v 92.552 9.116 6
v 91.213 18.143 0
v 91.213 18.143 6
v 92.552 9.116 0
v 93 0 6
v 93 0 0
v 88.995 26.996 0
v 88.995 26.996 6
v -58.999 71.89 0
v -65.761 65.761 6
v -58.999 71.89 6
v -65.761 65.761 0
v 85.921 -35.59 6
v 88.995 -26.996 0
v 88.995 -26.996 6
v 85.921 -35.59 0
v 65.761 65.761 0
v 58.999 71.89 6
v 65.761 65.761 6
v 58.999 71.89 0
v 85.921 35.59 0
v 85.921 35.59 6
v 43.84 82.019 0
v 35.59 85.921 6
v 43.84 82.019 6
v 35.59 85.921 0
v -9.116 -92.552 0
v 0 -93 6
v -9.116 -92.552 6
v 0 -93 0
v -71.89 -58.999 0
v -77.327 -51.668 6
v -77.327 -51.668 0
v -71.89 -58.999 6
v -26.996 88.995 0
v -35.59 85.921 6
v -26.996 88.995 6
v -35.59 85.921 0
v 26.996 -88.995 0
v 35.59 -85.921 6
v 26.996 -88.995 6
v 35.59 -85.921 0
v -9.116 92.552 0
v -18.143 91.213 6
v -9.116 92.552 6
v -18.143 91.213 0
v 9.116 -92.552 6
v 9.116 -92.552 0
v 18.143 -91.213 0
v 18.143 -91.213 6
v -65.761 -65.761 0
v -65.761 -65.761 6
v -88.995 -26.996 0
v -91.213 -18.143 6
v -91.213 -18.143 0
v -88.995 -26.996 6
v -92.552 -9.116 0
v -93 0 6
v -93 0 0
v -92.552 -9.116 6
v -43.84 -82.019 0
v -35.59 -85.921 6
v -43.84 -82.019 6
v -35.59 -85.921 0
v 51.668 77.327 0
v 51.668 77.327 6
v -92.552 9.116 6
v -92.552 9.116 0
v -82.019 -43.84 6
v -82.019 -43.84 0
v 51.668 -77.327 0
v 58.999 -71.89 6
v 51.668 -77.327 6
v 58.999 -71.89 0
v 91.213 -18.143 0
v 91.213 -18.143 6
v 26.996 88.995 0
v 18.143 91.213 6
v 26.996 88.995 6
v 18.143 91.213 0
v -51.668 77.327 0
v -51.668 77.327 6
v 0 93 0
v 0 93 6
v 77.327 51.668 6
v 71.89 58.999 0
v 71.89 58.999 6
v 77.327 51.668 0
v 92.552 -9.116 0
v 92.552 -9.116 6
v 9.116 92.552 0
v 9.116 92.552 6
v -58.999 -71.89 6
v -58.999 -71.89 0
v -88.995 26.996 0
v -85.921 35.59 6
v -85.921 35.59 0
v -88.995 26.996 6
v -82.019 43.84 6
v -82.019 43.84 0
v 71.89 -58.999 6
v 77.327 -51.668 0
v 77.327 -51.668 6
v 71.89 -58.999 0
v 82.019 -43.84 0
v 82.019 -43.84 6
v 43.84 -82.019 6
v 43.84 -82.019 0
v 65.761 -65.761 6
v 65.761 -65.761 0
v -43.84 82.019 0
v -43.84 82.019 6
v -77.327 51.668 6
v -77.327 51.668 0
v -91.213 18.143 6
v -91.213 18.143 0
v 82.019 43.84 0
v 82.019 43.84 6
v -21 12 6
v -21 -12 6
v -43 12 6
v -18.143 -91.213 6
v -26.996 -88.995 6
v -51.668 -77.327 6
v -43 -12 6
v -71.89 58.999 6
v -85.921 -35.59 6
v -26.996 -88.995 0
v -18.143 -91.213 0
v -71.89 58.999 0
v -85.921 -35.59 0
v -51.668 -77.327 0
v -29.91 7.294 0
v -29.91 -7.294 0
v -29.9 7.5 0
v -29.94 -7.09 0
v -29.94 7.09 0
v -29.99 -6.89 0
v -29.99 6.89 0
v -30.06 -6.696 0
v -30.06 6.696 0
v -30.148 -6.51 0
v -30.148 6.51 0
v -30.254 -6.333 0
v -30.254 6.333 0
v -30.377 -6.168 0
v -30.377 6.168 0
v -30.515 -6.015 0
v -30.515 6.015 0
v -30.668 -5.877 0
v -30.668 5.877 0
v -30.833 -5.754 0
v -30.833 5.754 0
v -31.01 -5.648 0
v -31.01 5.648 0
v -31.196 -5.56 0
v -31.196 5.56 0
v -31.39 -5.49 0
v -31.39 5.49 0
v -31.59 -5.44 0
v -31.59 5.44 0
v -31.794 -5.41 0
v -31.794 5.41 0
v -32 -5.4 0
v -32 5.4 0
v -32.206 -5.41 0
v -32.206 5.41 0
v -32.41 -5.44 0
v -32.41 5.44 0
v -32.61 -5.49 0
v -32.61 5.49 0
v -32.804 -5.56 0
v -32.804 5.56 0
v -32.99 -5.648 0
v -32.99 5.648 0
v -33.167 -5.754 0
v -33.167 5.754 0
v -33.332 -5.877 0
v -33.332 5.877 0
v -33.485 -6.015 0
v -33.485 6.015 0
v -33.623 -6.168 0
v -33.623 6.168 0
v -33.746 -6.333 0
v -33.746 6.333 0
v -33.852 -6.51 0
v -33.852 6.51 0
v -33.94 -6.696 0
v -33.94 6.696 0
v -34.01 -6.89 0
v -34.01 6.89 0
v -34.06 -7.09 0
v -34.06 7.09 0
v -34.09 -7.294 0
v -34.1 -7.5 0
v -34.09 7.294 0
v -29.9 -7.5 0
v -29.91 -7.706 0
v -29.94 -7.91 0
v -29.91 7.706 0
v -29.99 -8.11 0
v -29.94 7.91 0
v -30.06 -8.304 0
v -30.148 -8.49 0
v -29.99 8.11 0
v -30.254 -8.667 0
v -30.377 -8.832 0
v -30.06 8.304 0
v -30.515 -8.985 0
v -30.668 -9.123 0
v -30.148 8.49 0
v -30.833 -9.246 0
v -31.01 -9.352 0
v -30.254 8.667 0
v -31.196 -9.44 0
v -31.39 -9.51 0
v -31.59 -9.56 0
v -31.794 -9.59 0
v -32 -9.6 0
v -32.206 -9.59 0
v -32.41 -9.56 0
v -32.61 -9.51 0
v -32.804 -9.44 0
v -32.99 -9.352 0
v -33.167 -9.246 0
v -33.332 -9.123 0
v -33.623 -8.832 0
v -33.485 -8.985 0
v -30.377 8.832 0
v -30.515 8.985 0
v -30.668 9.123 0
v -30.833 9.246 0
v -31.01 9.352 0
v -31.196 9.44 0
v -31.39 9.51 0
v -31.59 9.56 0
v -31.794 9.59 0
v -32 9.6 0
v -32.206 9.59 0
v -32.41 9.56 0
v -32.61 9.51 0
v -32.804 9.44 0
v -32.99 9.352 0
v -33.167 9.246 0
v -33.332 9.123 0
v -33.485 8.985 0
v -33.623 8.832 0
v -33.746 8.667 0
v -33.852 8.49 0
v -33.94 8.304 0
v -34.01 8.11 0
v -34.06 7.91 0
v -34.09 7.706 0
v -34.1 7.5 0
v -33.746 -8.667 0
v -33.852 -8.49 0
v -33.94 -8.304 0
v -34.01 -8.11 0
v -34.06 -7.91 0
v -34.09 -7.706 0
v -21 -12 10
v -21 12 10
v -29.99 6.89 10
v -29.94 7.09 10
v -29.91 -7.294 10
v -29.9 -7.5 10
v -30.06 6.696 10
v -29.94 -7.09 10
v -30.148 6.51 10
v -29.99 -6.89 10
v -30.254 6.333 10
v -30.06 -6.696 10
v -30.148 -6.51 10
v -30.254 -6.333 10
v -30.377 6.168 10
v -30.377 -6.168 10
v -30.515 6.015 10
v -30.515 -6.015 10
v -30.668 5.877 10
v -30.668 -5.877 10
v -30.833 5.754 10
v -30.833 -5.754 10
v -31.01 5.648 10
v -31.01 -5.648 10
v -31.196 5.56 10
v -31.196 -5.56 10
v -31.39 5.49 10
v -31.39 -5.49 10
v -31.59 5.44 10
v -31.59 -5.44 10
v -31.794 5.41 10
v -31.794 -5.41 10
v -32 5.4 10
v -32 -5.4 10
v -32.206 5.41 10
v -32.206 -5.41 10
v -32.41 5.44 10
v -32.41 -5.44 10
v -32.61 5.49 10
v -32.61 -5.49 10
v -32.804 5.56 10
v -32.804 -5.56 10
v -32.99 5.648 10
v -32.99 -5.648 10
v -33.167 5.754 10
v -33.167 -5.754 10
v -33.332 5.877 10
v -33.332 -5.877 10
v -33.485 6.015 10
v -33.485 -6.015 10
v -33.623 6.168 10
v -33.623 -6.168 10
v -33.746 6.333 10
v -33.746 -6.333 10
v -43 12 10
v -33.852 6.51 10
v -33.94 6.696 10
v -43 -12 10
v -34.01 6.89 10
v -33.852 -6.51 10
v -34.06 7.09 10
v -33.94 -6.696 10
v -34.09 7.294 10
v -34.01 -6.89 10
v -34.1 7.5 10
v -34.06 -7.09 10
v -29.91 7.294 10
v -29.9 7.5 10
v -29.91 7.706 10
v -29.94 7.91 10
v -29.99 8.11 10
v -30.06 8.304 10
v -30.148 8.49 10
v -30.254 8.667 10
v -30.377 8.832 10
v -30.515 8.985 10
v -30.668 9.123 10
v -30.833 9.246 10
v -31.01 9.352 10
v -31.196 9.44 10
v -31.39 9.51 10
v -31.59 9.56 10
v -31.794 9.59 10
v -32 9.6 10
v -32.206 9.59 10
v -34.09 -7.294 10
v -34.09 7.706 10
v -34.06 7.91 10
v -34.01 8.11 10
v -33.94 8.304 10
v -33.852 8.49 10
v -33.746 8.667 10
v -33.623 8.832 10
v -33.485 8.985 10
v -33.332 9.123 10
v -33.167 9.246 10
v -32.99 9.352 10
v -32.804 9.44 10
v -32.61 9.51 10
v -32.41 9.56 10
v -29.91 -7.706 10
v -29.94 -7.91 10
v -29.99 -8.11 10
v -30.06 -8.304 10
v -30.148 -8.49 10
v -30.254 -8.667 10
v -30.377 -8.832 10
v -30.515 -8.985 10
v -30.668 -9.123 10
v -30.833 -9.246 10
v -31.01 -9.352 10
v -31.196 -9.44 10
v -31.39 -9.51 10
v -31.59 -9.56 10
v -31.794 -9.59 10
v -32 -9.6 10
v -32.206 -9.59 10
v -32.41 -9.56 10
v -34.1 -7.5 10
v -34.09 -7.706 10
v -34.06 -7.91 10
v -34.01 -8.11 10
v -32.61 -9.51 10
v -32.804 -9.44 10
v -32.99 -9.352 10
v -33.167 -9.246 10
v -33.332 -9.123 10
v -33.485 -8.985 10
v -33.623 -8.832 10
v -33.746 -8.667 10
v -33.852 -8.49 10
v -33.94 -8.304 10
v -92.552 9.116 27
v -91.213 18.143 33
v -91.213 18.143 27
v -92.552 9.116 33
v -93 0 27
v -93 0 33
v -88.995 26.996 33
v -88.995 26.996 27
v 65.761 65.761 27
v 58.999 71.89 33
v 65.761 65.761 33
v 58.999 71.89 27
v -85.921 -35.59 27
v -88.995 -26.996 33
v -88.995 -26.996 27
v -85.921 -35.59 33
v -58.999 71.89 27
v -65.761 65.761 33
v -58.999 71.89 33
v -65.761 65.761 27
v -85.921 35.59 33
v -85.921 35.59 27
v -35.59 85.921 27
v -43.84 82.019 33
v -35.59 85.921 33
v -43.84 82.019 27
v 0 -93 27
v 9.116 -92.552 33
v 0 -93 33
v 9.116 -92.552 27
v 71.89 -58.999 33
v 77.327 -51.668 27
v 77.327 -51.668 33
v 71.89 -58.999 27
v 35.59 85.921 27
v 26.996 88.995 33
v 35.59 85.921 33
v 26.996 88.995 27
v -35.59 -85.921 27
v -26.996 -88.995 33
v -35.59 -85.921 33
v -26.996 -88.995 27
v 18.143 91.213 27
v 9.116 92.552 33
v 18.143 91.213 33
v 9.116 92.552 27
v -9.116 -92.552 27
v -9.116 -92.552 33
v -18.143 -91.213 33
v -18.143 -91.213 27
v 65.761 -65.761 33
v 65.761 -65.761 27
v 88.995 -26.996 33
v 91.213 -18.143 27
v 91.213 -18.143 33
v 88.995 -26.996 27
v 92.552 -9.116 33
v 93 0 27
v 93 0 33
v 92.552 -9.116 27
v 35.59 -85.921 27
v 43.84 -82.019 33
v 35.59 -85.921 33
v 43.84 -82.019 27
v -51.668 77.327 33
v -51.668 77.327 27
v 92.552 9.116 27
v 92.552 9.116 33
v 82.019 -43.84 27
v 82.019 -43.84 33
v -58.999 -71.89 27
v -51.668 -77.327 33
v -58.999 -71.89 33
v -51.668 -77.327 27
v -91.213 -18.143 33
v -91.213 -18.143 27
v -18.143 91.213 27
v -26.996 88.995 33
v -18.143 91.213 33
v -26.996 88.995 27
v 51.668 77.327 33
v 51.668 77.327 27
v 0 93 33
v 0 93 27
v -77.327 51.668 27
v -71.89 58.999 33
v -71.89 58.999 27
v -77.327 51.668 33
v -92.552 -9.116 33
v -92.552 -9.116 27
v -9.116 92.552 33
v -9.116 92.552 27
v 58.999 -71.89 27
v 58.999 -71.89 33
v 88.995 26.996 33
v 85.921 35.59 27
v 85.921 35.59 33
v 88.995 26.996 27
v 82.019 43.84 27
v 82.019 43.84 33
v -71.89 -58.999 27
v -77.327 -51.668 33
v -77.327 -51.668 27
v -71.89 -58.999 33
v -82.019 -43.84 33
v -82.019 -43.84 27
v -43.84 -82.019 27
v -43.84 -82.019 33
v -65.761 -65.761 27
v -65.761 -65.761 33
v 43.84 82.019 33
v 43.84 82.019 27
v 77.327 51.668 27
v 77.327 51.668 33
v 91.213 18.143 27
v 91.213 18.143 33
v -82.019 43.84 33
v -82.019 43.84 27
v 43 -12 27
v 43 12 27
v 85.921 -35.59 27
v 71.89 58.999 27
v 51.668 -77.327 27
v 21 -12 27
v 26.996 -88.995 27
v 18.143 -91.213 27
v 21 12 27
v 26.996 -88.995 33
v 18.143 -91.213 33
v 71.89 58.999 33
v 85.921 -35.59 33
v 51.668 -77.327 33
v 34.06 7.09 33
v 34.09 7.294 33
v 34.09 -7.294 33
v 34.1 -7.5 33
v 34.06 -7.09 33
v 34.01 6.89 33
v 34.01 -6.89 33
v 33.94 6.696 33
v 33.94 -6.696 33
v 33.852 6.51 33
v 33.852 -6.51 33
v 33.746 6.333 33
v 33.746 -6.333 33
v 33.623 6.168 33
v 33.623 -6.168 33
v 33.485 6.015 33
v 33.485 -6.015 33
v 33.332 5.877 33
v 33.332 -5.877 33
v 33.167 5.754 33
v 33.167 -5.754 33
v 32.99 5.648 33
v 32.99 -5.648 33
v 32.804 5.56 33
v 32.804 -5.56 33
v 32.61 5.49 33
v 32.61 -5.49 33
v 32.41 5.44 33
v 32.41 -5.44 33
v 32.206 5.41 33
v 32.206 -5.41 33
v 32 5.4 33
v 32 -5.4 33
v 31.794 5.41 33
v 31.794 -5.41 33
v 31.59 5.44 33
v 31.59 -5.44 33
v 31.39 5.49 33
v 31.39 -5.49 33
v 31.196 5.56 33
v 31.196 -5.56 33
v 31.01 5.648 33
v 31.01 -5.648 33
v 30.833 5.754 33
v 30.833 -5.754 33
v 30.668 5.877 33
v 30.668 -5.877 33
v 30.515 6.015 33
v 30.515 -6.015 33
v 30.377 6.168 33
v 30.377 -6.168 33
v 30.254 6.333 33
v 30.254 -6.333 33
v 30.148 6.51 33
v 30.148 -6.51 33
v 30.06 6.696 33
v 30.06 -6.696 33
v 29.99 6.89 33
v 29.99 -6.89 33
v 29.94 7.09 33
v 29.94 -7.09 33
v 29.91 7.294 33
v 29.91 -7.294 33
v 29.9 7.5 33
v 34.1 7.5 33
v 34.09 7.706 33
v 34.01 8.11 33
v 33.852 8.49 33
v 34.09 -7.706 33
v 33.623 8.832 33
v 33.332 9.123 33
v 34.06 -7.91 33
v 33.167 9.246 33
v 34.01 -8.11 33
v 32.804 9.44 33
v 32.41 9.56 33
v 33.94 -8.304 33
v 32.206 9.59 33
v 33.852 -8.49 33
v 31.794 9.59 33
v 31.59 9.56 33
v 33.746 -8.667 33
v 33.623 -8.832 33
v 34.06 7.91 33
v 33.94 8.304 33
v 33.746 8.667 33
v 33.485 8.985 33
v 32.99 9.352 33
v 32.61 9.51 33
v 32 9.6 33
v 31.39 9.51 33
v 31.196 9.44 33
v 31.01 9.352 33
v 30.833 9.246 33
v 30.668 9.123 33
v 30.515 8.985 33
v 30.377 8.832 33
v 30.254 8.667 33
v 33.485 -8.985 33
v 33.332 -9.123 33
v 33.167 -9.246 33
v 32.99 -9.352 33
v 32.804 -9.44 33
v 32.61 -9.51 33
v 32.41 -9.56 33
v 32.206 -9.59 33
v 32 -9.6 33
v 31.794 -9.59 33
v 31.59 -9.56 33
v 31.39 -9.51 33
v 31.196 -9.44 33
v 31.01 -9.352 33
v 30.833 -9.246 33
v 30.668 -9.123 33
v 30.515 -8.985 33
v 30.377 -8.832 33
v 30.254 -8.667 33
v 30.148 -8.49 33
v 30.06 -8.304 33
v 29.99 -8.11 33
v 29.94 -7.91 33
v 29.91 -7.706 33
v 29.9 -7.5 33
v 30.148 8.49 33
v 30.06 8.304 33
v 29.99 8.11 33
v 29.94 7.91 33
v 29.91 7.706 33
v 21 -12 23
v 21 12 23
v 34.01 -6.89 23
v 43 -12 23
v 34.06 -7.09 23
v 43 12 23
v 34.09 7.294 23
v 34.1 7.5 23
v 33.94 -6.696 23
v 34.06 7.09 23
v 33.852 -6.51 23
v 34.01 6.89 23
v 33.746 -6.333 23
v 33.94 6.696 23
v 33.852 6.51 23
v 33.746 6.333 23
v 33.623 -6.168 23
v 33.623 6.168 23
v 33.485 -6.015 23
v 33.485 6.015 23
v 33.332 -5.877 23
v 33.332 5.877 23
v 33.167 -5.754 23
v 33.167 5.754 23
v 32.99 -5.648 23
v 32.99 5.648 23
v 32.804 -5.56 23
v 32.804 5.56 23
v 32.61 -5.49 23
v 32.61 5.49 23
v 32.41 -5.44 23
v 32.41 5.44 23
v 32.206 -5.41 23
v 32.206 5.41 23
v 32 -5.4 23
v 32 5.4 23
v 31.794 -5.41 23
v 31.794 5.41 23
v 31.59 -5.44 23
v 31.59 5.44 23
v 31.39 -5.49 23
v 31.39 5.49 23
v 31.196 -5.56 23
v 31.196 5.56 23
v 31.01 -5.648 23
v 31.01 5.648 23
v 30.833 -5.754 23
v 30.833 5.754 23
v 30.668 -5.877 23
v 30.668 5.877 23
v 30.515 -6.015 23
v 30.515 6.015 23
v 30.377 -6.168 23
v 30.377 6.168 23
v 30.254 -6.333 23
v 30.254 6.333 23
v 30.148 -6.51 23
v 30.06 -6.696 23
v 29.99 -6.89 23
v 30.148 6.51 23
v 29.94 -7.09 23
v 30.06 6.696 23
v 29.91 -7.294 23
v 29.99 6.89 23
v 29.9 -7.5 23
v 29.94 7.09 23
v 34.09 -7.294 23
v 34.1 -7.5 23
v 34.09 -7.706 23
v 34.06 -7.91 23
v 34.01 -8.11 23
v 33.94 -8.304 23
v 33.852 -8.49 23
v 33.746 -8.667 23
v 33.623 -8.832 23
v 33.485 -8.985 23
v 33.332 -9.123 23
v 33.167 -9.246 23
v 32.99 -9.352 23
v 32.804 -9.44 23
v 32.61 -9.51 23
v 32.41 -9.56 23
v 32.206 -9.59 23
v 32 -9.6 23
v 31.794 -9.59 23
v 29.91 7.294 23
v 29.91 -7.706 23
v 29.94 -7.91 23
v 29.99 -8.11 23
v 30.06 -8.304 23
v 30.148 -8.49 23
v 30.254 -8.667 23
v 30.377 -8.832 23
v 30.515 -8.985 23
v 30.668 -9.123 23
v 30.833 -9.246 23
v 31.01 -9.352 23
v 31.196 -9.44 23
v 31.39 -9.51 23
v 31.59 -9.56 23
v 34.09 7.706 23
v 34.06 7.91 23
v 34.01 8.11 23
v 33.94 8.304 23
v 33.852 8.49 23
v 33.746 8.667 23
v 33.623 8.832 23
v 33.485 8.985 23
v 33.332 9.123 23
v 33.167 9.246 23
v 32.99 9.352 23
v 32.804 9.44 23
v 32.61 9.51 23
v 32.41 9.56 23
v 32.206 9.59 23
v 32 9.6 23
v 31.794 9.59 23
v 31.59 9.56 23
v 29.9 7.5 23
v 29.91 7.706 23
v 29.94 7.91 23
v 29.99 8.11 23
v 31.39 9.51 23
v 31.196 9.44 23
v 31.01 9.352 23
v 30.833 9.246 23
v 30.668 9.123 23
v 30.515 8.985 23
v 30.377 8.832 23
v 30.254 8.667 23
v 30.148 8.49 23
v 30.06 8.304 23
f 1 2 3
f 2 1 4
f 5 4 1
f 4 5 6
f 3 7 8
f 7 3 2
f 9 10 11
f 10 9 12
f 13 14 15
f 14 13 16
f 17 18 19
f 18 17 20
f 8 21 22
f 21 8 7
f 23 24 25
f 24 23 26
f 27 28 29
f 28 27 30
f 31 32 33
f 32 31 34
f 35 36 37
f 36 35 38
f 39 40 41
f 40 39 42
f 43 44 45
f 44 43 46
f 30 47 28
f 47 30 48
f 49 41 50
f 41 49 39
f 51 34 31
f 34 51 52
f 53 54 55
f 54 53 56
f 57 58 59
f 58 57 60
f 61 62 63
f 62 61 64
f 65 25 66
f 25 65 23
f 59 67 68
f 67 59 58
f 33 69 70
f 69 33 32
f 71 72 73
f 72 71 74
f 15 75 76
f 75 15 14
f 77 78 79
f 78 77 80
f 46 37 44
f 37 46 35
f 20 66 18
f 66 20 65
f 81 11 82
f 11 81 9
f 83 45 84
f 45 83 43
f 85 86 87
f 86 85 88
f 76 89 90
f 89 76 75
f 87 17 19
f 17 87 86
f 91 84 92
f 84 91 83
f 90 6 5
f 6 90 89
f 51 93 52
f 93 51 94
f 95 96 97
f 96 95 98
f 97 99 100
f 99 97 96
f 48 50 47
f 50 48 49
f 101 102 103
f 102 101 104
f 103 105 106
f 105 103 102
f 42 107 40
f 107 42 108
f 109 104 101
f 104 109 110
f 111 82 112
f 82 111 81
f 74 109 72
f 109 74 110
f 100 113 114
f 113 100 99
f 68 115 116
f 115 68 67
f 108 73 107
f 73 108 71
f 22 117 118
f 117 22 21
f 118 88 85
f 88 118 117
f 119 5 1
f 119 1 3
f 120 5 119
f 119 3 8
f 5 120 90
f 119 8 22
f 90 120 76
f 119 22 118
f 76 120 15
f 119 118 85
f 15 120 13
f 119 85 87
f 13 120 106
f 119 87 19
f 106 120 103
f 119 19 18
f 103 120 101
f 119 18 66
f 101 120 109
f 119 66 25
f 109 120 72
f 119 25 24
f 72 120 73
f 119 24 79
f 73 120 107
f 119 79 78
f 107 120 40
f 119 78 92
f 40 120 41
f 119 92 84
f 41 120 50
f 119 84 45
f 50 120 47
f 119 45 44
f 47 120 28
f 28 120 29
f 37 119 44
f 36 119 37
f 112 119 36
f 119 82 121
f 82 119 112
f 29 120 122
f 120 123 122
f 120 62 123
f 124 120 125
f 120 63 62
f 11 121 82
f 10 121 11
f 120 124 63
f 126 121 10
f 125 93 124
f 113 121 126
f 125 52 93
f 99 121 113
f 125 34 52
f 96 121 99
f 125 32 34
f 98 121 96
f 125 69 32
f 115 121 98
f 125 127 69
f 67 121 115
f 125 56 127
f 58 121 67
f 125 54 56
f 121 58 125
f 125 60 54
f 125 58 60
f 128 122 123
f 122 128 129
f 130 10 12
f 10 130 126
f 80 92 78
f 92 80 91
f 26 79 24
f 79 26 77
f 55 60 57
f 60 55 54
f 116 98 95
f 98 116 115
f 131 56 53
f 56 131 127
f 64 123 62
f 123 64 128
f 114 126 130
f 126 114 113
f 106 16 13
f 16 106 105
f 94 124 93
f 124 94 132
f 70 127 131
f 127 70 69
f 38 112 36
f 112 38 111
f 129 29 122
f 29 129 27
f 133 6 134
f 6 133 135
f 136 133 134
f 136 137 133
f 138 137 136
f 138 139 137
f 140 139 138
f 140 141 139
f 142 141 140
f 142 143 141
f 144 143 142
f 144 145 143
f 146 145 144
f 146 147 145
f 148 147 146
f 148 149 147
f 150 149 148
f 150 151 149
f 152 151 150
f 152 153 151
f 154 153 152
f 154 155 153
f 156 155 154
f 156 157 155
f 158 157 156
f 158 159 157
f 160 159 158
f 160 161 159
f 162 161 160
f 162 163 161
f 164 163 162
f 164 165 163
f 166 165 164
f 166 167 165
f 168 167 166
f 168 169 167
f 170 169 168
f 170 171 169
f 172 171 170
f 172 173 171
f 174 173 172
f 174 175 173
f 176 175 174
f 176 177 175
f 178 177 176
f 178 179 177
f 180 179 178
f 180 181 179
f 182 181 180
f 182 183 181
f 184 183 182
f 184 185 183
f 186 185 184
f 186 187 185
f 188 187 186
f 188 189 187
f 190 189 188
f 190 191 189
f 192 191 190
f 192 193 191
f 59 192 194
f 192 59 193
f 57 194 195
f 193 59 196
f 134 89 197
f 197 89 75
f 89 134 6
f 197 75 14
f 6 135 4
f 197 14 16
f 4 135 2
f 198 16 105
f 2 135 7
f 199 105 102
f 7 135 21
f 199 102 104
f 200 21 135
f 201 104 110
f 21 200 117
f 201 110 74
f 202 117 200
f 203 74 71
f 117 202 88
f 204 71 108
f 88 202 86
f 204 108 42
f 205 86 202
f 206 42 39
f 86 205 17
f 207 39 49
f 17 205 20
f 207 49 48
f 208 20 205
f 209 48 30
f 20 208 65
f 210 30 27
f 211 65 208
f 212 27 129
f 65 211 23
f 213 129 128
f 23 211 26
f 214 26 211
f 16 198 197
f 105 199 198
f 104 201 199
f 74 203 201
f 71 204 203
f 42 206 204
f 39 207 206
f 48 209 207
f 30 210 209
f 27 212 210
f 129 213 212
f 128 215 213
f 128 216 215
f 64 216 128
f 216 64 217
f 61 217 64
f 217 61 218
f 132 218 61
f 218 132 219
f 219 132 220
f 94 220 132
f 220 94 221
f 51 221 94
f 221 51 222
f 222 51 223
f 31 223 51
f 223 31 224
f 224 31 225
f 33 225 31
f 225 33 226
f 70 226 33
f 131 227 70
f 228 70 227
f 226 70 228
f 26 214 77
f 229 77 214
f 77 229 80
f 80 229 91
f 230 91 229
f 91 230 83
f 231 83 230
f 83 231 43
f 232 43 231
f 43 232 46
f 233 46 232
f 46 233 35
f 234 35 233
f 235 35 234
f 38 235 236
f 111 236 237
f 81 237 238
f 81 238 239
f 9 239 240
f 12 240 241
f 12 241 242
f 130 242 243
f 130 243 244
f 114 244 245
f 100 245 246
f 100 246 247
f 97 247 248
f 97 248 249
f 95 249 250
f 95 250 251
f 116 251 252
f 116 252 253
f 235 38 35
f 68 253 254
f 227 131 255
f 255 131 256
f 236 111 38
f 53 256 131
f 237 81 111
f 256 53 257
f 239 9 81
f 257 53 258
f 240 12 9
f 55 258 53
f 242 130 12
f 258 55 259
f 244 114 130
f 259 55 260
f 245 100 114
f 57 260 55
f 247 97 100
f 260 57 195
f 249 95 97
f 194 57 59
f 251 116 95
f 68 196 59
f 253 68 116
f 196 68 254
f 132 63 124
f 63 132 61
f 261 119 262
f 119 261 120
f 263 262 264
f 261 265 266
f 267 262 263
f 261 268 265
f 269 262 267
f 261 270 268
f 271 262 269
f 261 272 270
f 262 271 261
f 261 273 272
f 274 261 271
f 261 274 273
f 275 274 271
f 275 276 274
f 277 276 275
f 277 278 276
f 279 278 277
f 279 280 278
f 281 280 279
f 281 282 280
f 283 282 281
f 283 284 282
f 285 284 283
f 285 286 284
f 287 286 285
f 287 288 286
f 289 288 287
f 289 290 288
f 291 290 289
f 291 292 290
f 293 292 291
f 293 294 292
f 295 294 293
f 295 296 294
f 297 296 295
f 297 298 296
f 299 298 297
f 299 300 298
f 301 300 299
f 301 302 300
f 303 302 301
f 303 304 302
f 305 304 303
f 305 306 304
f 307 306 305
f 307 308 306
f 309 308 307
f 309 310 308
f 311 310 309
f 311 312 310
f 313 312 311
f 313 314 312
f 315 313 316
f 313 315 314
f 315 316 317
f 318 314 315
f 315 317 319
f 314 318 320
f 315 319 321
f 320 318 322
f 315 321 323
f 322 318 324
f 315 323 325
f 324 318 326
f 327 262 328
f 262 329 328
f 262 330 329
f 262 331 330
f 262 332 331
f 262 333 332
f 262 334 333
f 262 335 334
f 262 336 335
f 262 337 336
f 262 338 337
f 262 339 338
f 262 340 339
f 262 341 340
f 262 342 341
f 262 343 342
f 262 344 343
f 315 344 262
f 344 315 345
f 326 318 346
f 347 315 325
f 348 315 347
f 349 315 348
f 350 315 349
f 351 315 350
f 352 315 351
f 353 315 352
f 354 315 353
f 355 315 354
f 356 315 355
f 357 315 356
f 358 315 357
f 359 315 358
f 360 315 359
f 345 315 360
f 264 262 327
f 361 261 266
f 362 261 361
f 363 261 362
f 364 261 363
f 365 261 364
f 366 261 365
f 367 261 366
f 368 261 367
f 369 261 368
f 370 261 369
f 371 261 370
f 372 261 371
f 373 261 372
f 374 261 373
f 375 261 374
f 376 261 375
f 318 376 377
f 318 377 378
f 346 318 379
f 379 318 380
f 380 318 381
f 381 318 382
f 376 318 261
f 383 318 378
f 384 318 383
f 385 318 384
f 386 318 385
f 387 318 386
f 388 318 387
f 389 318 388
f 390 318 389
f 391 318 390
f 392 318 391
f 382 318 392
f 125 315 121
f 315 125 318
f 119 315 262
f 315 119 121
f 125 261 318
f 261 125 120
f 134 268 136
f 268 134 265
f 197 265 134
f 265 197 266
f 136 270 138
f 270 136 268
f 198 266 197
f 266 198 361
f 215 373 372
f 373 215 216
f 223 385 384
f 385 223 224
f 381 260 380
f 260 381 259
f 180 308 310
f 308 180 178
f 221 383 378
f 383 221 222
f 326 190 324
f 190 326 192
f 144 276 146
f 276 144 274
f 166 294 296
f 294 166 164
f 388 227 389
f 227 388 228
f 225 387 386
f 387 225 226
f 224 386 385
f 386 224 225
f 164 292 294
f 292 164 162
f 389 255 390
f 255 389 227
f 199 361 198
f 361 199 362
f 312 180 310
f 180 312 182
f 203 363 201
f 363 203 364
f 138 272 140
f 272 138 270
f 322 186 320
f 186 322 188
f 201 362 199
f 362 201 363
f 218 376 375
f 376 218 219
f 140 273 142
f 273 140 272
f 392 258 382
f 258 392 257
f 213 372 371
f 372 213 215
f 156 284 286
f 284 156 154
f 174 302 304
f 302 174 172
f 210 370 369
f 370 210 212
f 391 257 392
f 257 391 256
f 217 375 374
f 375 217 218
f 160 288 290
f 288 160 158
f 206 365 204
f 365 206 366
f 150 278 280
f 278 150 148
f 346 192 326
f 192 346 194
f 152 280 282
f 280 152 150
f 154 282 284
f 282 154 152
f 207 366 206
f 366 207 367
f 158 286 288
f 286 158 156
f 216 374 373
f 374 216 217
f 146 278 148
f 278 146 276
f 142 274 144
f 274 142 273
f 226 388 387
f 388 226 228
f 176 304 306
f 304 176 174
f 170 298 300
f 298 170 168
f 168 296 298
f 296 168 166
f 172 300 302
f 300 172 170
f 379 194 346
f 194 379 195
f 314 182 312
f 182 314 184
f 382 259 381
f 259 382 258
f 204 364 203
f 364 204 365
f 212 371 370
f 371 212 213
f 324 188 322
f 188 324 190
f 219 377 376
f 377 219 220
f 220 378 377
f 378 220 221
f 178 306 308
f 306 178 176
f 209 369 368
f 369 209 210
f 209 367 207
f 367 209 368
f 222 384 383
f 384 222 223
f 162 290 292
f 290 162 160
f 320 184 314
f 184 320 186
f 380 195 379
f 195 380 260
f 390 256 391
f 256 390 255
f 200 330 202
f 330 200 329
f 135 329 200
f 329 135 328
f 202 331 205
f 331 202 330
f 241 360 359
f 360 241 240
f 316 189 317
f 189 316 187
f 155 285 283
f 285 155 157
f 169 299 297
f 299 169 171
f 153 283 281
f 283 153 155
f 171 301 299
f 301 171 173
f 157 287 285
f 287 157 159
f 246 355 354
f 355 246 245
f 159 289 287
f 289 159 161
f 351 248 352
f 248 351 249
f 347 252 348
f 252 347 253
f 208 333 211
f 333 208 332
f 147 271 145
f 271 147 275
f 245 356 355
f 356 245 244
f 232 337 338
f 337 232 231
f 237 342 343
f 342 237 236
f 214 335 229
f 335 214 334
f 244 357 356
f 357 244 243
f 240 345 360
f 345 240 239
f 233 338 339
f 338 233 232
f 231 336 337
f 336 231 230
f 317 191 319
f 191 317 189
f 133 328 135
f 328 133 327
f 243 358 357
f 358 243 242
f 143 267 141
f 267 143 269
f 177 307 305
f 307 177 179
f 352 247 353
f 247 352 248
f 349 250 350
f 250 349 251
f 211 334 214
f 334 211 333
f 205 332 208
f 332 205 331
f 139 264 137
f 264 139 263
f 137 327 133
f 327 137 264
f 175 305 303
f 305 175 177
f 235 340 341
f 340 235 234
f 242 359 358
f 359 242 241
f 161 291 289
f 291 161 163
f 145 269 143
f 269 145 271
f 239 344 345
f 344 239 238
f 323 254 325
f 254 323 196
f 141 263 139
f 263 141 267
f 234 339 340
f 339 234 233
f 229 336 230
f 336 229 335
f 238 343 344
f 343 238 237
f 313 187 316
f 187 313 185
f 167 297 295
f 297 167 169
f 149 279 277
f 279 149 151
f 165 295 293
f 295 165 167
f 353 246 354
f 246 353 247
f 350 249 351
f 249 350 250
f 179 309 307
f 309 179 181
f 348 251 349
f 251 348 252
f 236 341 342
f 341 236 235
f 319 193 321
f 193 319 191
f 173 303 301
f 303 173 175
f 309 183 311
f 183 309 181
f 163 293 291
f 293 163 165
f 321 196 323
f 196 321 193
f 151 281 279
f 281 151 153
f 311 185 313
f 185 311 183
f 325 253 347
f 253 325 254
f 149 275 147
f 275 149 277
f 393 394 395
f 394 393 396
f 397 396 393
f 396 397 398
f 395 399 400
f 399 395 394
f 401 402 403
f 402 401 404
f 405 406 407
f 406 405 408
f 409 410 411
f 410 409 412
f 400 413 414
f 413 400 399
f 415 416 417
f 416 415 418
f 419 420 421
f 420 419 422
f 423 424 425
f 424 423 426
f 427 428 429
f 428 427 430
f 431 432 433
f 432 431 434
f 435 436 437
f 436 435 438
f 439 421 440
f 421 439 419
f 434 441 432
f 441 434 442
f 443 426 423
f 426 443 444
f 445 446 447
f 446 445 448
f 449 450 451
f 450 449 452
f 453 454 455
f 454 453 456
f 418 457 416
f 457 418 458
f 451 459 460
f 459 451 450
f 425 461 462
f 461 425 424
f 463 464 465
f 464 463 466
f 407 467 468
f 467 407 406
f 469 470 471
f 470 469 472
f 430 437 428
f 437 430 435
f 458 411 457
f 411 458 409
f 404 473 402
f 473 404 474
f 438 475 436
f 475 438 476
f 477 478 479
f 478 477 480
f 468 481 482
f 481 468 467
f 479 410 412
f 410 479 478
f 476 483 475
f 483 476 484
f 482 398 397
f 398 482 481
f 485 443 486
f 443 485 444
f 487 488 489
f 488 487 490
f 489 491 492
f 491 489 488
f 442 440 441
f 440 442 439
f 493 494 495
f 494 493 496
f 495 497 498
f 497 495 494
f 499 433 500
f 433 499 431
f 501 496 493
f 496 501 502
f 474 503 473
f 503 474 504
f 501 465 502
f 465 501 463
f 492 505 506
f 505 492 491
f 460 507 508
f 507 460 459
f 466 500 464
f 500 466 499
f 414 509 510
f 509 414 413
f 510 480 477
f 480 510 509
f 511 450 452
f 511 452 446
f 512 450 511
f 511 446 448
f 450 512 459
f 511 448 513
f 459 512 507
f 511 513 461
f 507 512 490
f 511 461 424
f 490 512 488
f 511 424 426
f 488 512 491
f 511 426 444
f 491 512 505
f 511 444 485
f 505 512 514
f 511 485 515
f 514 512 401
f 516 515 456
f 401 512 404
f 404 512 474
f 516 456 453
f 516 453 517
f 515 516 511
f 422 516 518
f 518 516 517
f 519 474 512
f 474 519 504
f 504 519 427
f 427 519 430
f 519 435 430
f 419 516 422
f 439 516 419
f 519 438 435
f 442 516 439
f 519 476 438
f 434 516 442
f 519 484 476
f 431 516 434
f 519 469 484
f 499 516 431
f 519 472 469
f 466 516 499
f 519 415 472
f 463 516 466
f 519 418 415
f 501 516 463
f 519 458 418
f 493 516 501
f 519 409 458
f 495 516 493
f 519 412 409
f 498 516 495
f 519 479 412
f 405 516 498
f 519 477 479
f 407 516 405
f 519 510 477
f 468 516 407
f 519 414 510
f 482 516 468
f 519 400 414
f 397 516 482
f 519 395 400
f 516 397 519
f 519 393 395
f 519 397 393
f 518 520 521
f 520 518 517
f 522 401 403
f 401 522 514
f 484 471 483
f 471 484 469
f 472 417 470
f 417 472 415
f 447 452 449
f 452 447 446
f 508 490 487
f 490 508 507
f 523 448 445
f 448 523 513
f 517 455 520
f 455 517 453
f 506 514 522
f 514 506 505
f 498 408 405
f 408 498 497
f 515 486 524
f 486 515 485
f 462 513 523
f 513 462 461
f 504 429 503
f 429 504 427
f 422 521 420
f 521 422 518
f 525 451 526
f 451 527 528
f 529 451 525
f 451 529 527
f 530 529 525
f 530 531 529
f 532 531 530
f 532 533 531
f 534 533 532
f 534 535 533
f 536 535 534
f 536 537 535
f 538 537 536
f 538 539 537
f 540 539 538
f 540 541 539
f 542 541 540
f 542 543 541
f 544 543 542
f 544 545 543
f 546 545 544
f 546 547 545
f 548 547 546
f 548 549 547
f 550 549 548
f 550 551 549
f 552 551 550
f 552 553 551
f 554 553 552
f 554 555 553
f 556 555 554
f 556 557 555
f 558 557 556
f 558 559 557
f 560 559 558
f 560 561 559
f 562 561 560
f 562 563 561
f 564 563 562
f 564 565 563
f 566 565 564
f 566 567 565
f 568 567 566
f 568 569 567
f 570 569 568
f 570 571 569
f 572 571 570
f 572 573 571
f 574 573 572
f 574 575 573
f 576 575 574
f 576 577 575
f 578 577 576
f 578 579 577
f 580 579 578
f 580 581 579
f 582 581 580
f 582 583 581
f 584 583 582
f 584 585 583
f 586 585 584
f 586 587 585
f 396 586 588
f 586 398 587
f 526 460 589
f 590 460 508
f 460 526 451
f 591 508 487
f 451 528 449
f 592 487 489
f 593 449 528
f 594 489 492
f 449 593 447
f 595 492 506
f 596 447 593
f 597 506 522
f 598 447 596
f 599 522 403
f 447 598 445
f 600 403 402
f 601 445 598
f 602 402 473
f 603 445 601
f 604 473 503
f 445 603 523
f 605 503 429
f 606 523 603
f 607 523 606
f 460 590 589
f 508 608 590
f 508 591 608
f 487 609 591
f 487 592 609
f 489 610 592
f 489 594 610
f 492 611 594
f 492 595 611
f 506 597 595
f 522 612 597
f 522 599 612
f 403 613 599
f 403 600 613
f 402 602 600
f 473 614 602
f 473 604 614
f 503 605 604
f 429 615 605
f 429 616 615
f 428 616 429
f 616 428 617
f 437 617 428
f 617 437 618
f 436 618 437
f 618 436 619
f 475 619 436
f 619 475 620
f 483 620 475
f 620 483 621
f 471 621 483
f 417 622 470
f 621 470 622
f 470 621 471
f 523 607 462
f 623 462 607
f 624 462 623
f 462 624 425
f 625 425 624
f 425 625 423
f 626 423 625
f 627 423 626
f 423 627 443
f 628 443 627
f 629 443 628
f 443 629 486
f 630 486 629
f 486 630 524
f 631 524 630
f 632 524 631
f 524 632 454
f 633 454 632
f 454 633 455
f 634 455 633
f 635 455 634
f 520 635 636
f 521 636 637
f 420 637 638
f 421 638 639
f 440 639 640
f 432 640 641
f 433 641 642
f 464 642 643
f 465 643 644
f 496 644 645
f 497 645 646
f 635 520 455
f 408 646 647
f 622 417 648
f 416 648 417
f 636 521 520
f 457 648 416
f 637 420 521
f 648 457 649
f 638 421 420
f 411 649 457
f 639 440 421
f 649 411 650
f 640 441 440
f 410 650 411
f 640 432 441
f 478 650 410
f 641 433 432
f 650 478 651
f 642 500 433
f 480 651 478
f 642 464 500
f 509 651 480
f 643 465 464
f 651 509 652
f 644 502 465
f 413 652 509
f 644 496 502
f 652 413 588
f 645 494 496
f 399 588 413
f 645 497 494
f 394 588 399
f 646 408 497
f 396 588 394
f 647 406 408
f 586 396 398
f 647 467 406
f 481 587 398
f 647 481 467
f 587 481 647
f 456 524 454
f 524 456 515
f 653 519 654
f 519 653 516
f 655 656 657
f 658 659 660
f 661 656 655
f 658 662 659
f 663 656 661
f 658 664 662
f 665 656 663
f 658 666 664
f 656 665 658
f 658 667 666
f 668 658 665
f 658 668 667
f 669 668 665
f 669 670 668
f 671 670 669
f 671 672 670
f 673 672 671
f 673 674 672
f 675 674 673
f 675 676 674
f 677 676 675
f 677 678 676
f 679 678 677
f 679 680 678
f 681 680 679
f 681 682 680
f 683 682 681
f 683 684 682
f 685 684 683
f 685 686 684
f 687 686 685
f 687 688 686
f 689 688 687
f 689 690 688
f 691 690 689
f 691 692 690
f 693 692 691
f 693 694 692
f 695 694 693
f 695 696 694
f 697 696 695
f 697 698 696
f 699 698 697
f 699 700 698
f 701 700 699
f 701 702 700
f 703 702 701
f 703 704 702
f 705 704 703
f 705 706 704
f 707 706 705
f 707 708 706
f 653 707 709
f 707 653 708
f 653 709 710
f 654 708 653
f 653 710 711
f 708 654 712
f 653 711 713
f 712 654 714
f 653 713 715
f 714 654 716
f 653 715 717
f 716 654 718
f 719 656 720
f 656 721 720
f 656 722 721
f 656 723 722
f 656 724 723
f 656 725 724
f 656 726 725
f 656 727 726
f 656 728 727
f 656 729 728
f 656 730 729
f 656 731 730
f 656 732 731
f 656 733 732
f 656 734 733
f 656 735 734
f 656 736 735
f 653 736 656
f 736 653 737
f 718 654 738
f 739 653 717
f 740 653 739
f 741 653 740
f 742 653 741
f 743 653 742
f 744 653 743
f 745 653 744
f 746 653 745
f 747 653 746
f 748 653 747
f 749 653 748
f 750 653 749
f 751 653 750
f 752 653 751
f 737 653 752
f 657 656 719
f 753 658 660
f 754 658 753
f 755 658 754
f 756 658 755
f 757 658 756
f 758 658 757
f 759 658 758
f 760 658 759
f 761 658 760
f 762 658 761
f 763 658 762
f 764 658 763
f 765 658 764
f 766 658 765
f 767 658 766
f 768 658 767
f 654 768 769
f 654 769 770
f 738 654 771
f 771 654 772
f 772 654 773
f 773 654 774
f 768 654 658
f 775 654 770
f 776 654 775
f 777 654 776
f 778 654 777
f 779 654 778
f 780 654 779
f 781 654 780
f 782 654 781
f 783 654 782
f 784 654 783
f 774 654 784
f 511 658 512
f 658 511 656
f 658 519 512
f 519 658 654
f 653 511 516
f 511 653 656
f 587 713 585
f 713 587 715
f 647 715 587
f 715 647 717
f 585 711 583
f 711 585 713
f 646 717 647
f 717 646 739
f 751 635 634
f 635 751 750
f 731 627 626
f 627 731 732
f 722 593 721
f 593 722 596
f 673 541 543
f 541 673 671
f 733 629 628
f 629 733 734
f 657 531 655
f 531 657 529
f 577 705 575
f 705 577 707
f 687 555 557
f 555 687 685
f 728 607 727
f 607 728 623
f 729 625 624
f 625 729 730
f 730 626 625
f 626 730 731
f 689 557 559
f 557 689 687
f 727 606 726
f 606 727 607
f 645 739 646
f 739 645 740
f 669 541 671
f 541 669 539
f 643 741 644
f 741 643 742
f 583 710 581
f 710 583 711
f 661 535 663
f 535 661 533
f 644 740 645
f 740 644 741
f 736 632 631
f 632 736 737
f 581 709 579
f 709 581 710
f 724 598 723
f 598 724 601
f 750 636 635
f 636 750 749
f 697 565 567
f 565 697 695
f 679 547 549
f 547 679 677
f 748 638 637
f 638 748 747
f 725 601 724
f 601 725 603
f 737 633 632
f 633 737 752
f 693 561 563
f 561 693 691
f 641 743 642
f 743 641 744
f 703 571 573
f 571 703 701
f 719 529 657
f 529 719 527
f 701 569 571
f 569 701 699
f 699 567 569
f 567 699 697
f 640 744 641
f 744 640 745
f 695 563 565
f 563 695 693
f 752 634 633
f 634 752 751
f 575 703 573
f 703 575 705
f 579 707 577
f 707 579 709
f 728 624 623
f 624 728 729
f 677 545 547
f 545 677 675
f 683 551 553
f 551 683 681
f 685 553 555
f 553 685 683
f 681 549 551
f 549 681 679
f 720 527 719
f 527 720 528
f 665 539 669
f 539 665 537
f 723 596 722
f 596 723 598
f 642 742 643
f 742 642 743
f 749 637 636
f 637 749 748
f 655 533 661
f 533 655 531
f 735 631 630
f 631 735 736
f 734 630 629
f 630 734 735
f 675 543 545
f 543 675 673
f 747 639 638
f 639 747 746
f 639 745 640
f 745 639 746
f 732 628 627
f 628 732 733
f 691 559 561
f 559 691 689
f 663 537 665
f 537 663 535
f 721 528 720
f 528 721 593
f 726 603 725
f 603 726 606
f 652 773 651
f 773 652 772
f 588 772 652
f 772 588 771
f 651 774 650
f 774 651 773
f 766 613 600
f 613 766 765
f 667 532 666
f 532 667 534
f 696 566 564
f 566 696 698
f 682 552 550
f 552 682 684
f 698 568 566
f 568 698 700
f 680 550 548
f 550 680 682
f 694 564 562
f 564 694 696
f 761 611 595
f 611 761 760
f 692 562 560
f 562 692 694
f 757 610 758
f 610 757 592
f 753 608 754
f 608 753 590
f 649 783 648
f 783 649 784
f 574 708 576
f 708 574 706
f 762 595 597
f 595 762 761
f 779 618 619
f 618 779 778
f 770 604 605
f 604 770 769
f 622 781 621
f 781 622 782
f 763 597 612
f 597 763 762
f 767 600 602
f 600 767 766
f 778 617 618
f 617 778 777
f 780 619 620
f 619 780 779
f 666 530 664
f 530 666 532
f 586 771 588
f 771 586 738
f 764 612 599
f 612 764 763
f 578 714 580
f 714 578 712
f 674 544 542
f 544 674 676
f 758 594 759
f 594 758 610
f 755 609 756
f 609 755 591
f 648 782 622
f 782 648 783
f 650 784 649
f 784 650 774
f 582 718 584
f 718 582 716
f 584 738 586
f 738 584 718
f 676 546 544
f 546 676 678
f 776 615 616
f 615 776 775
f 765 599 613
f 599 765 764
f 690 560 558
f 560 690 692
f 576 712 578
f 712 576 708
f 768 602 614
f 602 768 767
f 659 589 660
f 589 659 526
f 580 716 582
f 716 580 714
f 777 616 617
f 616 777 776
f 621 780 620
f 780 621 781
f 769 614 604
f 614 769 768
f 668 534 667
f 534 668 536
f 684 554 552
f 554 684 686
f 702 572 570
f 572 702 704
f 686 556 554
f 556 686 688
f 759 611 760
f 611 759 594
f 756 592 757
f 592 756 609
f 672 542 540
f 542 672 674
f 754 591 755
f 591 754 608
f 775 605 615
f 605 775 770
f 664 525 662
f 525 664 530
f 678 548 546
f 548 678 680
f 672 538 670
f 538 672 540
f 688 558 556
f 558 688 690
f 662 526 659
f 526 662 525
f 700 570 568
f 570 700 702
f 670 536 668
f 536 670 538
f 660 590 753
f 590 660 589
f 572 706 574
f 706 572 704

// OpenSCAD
// file: params.scad
// =============================================================================
// GreenThumbs Plantekrukke — Centrale parametre
// =============================================================================
// Single source of truth for alle dimensioner.
// Ændringer her propagerer til alle .scad-filer der bruger 'use <params.scad>'.
//
// Konvention: alle mål i mm. Vinkler i grader. Tolerances er positive (clearance).
// =============================================================================


// ----------------------------------------------------------------------------
// 1. Plant cup (skiftelig pr. plantestørrelse)
// ----------------------------------------------------------------------------
// Tre størrelser. Skift cup_size for at re-eksportere en anden variant.
cup_size = "M";  // "S" | "M" | "L"

cup_diameter = (cup_size == "S") ? 100 :
               (cup_size == "M") ? 140 :
               180;  // L

cup_height = (cup_size == "S") ? 120 :
             (cup_size == "M") ? 160 :
             200;  // L

cup_wall = 2.4;                  // vægtykkelse (6 perimeters @ 0.4mm nozzle)
cup_drain_hole_d = 4;            // diameter på drænhuller i bund
cup_drain_holes_count = 7;       // hex-mønster: 1 center + 6 ring

// Soil sensor slot (snap-fit i indvendig væg)
soil_sensor_w = 12;              // bredde af sensor PCB
soil_sensor_t = 1.8;             // tykkelse af sensor PCB
soil_sensor_slot_depth = 80;     // hvor langt ned sensor stikkes


// ----------------------------------------------------------------------------
// 2. Reservoir
// ----------------------------------------------------------------------------
reservoir_volume_ml = 700;       // 700 eller 1500

// Indvendig diameter: standardiseret så plant cups passer
reservoir_inner_d = 180;         // skal være >= max(cup_diameter)
reservoir_outer_d = reservoir_inner_d + 2 * 3;  // 3mm wall
reservoir_wall = 3;              // tykkere end cup (vandtryk + stabilitet)

// Højde beregnet ud fra volumen (cylinder)
// V = pi * r^2 * h  →  h = V / (pi * r^2)
// Tilføj +30mm for top-ring og sensor-clearance
reservoir_height = reservoir_volume_ml * 1000 /
                   (PI * pow(reservoir_inner_d / 2, 2)) + 30;

// Top-ring til plant cup
top_ring_width = 8;              // bredden af flange-overlap
top_ring_height = 4;

// Water level strip slot (vertikal kanal indvendig)
waterlevel_strip_w = 18;
waterlevel_strip_t = 2;
waterlevel_strip_h = 60;         // strip rækker fra bund og op

// Float switch niche (vandret monteret i bund)
float_switch_d = 16;             // typisk vertical float switch
float_switch_h = 25;
float_switch_x = 20;             // offset fra reservoir-center til niche

// Pump output port (i siden, op til drip-ring)
pump_port_d = 7;                 // 4mm slange + 1.5mm wall + tolerance
pump_port_z = 15;                // højde over reservoir bund

// Refill tube (integreret i siden, vertikal)
refill_tube_outer_d = 22;
refill_tube_inner_d = 16;        // funnel i top
refill_tube_z_top = reservoir_height - 5;
refill_tube_z_bottom = 10;       // 1cm fra bund


// ----------------------------------------------------------------------------
// 3. Electronics base (vandtæt kammer)
// ----------------------------------------------------------------------------
ebase_outer_d = reservoir_outer_d;  // matcher reservoir for stack-look
ebase_height = 40;                  // højde af elektronik-kammer
ebase_wall = 3;                     // tykkere walls for stabilitet
ebase_lid_height = 5;               // tykkelse af snap-on låg

// O-ring/gasket groove på top (forbinder med reservoir bund)
gasket_groove_w = 2.5;              // for 2mm O-ring
gasket_groove_d = 1.6;
gasket_groove_offset = 4;           // fra ydre kant

// Cable gland gennemføring (USB-C + sensor wires)
gland_hole_d = 12;                  // PG7 = 12mm hole
gland_count = 2;                    // 1x USB-C, 1x sensor-bundt

// Drænhul (fail-safe ved lækage)
drain_hole_d = 3;


// ----------------------------------------------------------------------------
// 4. Load cell mount
// ----------------------------------------------------------------------------
// Bar load cell — TAL220 5kg eller equivalent
// (Samme fysiske dimensioner som 1kg-varianten; 5kg giver safety margin for
// succulenter/orkide. Se ADR 004.)
loadcell_length = 80;
loadcell_height = 13;
loadcell_width = 13;
loadcell_screw_spacing = 15;     // afstand mellem M4-huller på cellen

// Hvor langt fra cellens center er bolt-hullerne (ene end vs anden end)
// Standard TAL220: ~8mm fra hver ende. Negativ = fixed end, positiv = free end.
loadcell_fixed_x = -loadcell_length / 2 + 8;  // ≈ -32mm for 80mm cell
loadcell_free_x  =  loadcell_length / 2 - 8;  // ≈ +32mm

// Cantilever boss-dimensioner — KRITISK for at cellen kan bøje korrekt
// Boss højde skaber air-gap mellem cell midte og plader. Min ~3mm.
// Boss centreres OMKRING bolt-positionen (loadcell_fixed_x / loadcell_free_x).
boss_height = 4;                 // air-gap mellem cell og plade-overflade
boss_l = 22;                     // langs cellens akse (x) — minimum ~15mm + margin
boss_w = 24;                     // tværs på cellen (y) — skal omslutte 15mm hul-spacing

// Platform pladerne (over og under load cell)
platform_d = ebase_outer_d;      // matcher base
platform_thickness = 6;
// Total separation = under-boss + cell + over-boss
platform_separation = 2 * boss_height + loadcell_height;


// ----------------------------------------------------------------------------
// 5. Toleranser og print-settings
// ----------------------------------------------------------------------------
print_tolerance = 0.3;           // generisk clearance for snap-fits
press_fit_tolerance = 0.1;       // for trykpas (heat-set inserts, gaskets)
wall_thickness = 2.4;            // default for non-water parts

// Heat-set inserts (M3x5mm)
m3_insert_d = 4.0;               // hul-diameter for melt-in fit
m3_insert_h = 5.0;
m3_screw_head_d = 6.0;           // M3 socket head clearance


// ----------------------------------------------------------------------------
// 6. Globale rendering settings
// ----------------------------------------------------------------------------
$fn = 64;                        // smooth cylinder facets; sæt højere for final render
PI = 3.14159265;                 // OpenSCAD har built-in PI, men eksplicit her for clarity


// ----------------------------------------------------------------------------
// Debug: print params til console når denne fil køres direkte
// ----------------------------------------------------------------------------
// echo() er sikre at have her — de udskriver til console også når filen
// inkluderes af andre. Til gengæld må der IKKE være top-level geometri
// (cylinder, cube, etc.) her — det ville forurene alle includere.
// Hvis du vil se geometri ved at åbne params.scad direkte, så åbn i stedet
// en af part-filerne (plant_cup.scad, reservoir.scad, ...) der include'er denne.
echo("=== GreenThumbs CAD params ===");
echo("cup_size:", cup_size);
echo("cup_diameter:", cup_diameter, "mm");
echo("cup_height:", cup_height, "mm");
echo("reservoir_volume:", reservoir_volume_ml, "ml");
echo("reservoir_height:", reservoir_height, "mm");
echo("reservoir_outer_d:", reservoir_outer_d, "mm");
echo("electronics_base_height:", ebase_height, "mm");
// main file
// =============================================================================
// Load Cell Mount — Vægt-platform under hele krukken (OPTIONAL)
// =============================================================================
// OPTIONAL hardware: kun nødvendigt hvis du vil bruge orkide-profilen
// (DETECT_WEIGHT) eller HYBRID-mode på succulenter. For Monstera/Peace Lily/
// store jord-baserede planter kan du SKIPPE denne del og bare sætte stick-on
// rubber feet under electronics_base_lid. Se ADR 004 for begrundelse.
//
// =============================================================================
// CANTILEVER PRINCIP — vigtig forståelse!
// =============================================================================
// En bar/beam strain gauge load cell måler ved at BØJE under belastning.
// Det betyder:
//   - ÉT end skal være rigidt fastgjort (FIXED END)
//   - Det ANDET end skal være FRIT til at bøje (FREE END, hvor lasten påføres)
//   - Cellens MIDTE må IKKE røre noget (skal være i luft)
//
// Hvis BEGGE ender klampes mellem to flade plader → cellen kan ikke bøje →
// strain gauges læser ~0 uanset belastning. Det er en common mistake.
//
// Vores løsning: STANDOFF-BOSSER der kun kontakter cellen ved bolt-punkterne.
//
//                  ┌─────────────────────────────┐  ← Upper plate
//                  │           ╔══════╗          │
//                  │           ║ BOSS ║          │  ← Boss kun ved FREE END
//                  │           ╚══[M4 bolt ↓]    │     (hænger ned)
//                                  ║
//                          air gap ║  ← cellen bøjer her
//                                  ║
//                  ╔═══════════════╩════════════════════╗  ← Load cell
//                  ║                                    ║      (horisontal)
//                  ╚════[M4 bolt ↑]═════════════════════╝
//                       ║
//                  ╔════╩════╗
//                  ║  BOSS  ║                              ← Boss kun ved FIXED END
//                  ┌────────╩─────────────────────────────┐  ← Lower plate
//                  └──────────────────────────────────────┘
//                          (krukken hviler på upper plate via electronics_base)
//
// =============================================================================
// PRINT-STRATEGI
// =============================================================================
// Begge plader er ens (boss på ene end). Print TO identiske kopier af
// plate_with_boss(). Under samling:
//   - Lower plate: brug som den er printet (boss-side opad)
//   - Upper plate: FLIP den 180° så boss-side vender NEDAD
//                  + roter så boss-end er over cellens FREE END
//
// PRINT: PLA eller PETG. 30% gyroid infill er fint. Ingen support
// (boss er flad-top). Print boss-side UP.
// =============================================================================

include <params.scad>

// ─── Render-mode selector ───────────────────────────────────────────────────
// "assembled" = vis hele samlingen (lower + cell + upper)
// "plate"     = vis kun ÉN plade i print-orientation (boss-side up)
render_mode = "assembled";

// ─── Bygge-blok: en plade med boss ved FIXED-end position ───────────────────
// Bossens CENTER ligger ved loadcell_fixed_x, så når cellens M4-huller er
// præcis ved loadcell_fixed_x, sidder bolt-hullerne i pladen lige under dem.
module plate_with_boss() {
    difference() {
        union() {
            // Hoved-plade
            cylinder(d = platform_d, h = platform_thickness);

            // Standoff boss — CENTRERET på loadcell_fixed_x
            translate([loadcell_fixed_x - boss_l / 2,
                       -boss_w / 2,
                       platform_thickness - 0.01])
                cube([boss_l, boss_w, boss_height + 0.01]);
        }

        // M4-bolt huller PRÆCIS ved loadcell_fixed_x (matcher cellens huller)
        for (dy = [-loadcell_screw_spacing / 2,
                    loadcell_screw_spacing / 2]) {
            translate([loadcell_fixed_x, dy, -0.5])
                cylinder(d = 4.2,
                         h = platform_thickness + boss_height + 1);
        }
    }
}

// ─── Samlet visualisering ───────────────────────────────────────────────────
module load_cell_assembly() {
    // Lower plate — brug som den er
    plate_with_boss();

    // Load cell visualisering (background — printes ikke)
    %translate([0, 0, platform_thickness + boss_height])
        load_cell_dummy();

    // Upper plate — flippet 180° om Y-aksen (mirrors X og Z)
    // Translateret op så bossen netop rører cellens FREE-end top
    upper_z_offset = 2 * (platform_thickness + boss_height) + loadcell_height;
    translate([0, 0, upper_z_offset])
        rotate([0, 180, 0])
            plate_with_boss();
}

// ─── Load cell visualization (kun til preview, ikke printet) ────────────────
module load_cell_dummy() {
    color([0.5, 0.5, 0.55])
        translate([-loadcell_length / 2, -loadcell_width / 2, 0])
            cube([loadcell_length, loadcell_width, loadcell_height]);

    // Marker fixed end med rødt
    color([0.8, 0.2, 0.2])
        translate([loadcell_fixed_x - 2, -loadcell_width / 2 - 0.1, 0])
            cube([4, loadcell_width + 0.2, loadcell_height]);

    // Marker free end med grønt
    color([0.2, 0.8, 0.2])
        translate([loadcell_free_x - 2, -loadcell_width / 2 - 0.1, 0])
            cube([4, loadcell_width + 0.2, loadcell_height]);
}

// ─── Output baseret på render_mode ──────────────────────────────────────────
if (render_mode == "assembled") {
    load_cell_assembly();
} else if (render_mode == "plate") {
    plate_with_boss();
} else {
    echo("ERROR: render_mode skal være 'assembled' eller 'plate'");
}
